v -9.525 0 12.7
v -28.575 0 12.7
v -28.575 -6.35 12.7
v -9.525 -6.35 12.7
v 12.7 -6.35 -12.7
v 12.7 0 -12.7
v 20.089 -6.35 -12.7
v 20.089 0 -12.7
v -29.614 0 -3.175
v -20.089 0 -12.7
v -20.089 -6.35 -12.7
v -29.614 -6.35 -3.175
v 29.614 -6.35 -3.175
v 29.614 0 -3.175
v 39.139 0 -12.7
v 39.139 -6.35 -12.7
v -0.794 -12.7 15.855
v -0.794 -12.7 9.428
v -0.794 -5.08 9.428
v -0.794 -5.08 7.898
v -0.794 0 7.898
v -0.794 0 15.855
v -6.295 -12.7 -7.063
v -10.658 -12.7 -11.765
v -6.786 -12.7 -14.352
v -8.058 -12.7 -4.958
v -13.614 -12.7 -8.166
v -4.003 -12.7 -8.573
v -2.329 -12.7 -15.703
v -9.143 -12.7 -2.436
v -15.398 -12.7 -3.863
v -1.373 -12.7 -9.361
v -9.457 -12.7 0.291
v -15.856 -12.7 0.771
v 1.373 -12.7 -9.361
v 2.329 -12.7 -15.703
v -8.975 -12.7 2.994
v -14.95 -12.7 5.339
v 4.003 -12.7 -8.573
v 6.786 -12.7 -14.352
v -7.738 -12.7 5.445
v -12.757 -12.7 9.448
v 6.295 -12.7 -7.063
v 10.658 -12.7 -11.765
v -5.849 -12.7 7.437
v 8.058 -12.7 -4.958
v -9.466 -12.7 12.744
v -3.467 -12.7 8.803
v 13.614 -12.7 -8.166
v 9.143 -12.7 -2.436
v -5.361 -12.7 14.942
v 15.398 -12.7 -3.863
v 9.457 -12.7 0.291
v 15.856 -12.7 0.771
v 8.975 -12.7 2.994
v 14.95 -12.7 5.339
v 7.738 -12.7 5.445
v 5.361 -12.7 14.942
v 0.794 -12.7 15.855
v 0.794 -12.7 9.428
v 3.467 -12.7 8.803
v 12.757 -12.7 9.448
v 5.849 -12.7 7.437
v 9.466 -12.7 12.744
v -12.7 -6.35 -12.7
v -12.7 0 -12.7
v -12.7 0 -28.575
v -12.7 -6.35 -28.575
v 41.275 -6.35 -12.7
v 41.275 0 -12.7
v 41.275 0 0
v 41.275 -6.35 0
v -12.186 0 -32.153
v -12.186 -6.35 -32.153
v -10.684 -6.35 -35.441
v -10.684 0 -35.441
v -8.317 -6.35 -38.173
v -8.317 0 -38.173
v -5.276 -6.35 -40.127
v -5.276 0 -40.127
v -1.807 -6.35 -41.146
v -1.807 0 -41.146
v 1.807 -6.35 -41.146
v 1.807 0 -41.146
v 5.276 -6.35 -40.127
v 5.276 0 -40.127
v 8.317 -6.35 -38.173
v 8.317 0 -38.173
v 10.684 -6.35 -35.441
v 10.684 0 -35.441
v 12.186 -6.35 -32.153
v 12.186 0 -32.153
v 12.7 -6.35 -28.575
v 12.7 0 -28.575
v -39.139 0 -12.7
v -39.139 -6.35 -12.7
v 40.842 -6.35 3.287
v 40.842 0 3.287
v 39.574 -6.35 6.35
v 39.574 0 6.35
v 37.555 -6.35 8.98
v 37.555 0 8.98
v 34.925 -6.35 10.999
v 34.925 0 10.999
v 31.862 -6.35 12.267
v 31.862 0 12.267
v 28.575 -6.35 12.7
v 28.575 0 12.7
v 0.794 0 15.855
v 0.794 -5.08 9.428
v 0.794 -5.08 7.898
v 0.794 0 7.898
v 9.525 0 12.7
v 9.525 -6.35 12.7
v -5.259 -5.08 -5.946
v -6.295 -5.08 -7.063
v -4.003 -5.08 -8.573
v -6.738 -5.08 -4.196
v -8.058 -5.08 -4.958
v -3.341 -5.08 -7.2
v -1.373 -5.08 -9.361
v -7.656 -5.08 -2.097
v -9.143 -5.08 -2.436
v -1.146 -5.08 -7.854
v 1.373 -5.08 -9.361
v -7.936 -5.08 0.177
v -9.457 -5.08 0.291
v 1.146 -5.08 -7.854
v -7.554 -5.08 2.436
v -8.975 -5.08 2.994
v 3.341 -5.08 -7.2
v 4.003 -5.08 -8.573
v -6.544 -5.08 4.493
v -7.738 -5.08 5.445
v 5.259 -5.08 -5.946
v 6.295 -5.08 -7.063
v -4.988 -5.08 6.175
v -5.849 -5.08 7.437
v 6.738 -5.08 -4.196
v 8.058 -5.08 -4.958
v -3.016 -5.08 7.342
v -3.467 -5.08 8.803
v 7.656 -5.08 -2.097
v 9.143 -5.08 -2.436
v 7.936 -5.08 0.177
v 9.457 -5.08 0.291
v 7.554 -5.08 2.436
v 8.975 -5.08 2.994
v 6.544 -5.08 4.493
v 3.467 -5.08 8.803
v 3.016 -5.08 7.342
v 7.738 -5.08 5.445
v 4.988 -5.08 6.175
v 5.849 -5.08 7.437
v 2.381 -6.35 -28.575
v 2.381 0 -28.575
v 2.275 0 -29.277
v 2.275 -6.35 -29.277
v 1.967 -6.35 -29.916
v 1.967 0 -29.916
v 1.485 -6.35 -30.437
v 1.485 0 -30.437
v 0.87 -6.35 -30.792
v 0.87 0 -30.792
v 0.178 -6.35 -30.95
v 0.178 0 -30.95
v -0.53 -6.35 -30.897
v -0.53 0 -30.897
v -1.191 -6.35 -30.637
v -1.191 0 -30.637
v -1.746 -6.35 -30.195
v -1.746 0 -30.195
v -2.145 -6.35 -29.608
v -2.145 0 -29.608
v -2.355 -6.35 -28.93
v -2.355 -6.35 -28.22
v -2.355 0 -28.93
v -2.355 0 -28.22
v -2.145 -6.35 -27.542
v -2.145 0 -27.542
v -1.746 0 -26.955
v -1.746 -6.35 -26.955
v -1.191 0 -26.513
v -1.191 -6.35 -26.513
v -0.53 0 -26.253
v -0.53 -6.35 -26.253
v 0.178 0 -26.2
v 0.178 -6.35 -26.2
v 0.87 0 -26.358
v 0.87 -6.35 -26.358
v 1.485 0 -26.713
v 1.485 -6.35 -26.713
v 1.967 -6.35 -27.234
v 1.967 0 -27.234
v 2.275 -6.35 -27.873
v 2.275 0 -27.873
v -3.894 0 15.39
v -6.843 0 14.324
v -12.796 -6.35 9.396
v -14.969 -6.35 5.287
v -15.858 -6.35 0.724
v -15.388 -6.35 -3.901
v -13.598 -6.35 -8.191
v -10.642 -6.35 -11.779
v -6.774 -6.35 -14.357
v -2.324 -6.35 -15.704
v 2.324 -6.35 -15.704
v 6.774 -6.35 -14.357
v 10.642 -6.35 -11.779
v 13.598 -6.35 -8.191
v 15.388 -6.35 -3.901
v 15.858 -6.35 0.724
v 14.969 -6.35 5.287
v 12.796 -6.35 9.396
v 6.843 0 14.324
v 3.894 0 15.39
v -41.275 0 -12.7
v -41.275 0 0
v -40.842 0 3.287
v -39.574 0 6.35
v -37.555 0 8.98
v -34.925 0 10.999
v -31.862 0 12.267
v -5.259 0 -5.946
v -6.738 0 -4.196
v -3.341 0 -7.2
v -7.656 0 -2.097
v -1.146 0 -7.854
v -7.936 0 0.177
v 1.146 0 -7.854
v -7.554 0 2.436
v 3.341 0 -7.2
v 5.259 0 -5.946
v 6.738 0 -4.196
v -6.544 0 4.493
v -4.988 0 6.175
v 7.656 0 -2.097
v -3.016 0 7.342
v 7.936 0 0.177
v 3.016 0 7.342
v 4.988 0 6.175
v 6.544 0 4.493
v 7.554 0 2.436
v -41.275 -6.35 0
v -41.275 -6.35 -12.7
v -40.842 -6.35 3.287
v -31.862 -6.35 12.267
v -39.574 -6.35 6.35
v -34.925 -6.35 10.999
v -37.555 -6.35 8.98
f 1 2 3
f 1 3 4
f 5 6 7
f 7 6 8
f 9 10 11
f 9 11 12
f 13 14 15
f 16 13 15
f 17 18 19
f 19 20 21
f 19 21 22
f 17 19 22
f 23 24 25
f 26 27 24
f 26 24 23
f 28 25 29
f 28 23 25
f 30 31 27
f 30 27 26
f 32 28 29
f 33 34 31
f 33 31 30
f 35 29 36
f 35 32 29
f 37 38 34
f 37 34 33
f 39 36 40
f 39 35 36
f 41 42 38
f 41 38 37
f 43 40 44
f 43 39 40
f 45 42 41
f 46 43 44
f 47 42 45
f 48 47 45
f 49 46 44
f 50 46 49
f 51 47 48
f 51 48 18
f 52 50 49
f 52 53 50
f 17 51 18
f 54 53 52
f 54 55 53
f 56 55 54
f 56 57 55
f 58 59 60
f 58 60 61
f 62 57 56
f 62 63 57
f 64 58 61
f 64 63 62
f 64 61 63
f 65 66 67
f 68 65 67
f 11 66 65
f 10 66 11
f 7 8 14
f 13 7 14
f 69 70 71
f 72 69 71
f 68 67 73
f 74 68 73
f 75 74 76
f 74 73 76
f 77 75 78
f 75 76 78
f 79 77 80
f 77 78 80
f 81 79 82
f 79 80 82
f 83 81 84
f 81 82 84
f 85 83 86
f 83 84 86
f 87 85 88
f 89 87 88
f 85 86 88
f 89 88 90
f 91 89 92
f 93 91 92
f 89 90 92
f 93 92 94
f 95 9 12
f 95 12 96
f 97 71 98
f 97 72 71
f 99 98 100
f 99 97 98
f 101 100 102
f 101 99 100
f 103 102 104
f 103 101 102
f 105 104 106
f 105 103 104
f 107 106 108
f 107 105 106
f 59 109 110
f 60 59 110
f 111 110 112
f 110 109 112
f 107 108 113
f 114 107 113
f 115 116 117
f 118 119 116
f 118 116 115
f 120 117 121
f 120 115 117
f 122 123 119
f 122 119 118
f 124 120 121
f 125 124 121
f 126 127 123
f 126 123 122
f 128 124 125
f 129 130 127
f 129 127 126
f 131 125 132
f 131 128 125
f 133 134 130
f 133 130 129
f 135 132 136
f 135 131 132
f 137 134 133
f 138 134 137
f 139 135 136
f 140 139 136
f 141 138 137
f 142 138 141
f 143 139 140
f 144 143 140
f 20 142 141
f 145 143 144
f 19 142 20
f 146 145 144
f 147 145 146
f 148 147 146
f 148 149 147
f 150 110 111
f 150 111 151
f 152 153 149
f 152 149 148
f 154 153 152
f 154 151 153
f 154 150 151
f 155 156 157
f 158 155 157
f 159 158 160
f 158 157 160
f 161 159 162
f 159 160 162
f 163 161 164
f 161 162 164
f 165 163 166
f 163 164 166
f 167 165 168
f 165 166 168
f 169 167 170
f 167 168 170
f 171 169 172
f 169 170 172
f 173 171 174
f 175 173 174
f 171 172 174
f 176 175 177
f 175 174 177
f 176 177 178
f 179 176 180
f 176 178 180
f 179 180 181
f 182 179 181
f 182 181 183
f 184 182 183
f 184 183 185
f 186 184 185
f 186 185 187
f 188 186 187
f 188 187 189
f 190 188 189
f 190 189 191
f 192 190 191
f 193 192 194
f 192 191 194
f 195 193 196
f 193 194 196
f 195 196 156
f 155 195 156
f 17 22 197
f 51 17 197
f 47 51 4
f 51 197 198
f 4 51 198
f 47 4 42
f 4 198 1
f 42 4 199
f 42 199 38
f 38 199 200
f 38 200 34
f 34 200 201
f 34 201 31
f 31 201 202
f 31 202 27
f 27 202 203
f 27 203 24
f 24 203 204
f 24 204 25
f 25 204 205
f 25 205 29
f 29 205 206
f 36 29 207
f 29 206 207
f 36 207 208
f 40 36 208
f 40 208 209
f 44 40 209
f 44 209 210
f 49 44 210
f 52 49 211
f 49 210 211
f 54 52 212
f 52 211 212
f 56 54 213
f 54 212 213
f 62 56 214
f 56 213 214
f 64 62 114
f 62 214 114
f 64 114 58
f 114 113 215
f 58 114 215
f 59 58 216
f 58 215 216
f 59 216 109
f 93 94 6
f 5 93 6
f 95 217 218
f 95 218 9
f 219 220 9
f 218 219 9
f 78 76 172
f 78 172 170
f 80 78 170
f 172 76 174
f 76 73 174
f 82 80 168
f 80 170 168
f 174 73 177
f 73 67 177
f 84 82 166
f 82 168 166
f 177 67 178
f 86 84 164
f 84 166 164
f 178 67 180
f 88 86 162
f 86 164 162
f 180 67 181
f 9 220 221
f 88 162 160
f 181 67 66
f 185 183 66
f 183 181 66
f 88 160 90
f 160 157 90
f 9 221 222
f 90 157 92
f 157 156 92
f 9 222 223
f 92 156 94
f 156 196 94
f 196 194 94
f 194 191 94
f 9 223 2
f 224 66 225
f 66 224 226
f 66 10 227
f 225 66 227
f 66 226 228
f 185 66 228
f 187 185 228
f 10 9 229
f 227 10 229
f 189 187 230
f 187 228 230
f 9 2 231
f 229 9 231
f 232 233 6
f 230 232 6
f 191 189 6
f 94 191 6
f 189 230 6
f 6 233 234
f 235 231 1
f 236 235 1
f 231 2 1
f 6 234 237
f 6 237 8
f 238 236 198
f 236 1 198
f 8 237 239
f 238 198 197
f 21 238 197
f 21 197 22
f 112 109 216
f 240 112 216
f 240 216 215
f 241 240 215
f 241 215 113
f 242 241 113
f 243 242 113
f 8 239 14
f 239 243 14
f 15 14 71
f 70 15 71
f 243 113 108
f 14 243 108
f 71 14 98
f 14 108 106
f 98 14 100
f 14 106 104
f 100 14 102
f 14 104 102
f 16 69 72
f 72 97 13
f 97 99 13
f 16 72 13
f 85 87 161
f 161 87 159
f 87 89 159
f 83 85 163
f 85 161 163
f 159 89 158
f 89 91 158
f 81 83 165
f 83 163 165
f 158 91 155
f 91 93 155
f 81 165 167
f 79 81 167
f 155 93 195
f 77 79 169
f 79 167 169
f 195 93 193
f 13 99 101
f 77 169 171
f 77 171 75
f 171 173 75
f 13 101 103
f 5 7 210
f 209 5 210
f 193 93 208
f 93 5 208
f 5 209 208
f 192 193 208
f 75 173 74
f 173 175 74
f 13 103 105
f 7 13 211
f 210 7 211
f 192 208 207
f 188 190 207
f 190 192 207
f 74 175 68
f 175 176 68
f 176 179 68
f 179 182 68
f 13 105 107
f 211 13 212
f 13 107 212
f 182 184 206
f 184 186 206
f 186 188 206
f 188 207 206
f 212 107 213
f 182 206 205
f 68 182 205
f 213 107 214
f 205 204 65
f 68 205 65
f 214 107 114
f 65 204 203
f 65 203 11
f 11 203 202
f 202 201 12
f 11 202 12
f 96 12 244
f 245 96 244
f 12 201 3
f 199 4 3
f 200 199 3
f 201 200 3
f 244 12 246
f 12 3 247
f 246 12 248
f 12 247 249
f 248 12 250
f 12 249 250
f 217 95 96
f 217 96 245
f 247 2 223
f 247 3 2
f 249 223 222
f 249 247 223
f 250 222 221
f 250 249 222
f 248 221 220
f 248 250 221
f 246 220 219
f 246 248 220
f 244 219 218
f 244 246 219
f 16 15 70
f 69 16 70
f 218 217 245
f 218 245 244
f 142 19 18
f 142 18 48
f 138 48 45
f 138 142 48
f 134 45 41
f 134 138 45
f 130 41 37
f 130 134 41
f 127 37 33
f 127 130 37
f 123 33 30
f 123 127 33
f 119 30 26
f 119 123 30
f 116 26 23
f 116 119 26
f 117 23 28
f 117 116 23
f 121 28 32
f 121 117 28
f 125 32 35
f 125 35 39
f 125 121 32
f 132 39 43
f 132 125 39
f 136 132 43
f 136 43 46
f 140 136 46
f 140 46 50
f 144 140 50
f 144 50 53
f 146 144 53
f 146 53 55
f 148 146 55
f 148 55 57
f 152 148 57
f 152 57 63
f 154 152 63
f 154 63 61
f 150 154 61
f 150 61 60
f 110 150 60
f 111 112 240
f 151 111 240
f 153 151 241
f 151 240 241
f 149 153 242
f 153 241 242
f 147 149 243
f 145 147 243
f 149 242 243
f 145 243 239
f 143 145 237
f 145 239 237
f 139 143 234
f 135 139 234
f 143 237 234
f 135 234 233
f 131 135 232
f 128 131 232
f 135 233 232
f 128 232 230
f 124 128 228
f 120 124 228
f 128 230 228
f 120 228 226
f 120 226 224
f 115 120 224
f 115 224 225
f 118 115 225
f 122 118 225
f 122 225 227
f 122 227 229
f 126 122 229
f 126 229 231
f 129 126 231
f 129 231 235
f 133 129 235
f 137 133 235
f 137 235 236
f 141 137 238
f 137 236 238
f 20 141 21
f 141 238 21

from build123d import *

# Parameters (mm, degrees)
F0_R      = 15.875
F0_R_2    = 9.4615
F1_DEPTH  = 12.7
F3_DEPTH  = 6.35
F5_DEPTH  = 6.35
F7_R      = 12.7
F8_W      = 1.5875
F8_H      = 18.0220451
F9_DEPTH  = 12.701
F11_DEPTH = 5.08


with BuildPart() as f1:
    # F0 (on Front) → F1 (new body)
    with BuildSketch(Plane.XZ):
        Circle(F0_R)
        Circle(F0_R_2, mode=Mode.SUBTRACT)
    extrude(amount=F1_DEPTH)

    # F2 (on Front) → F3 (join)
    with BuildSketch(Plane.XZ):
        with BuildLine():
            Line((12.7, -9.525), (-12.7, -9.525))
            Line((-12.7, -9.525), (-12.7, -28.575))
            Line((-12.7, -28.575), (-2.38125, -28.575))
            ThreePointArc((-2.38125, -28.575), (0, -26.19375), (2.38125, -28.575))
            Line((2.38125, -28.575), (12.7, -28.575))
            Line((12.7, -28.575), (12.7, -9.525))
        make_face()
        with BuildLine():
            Line((-2.38125, -28.575), (-12.7, -28.575))
            ThreePointArc((-12.7, -28.575), (0, -41.275), (12.7, -28.575))
            Line((12.7, -28.575), (2.38125, -28.575))
            ThreePointArc((2.38125, -28.575), (0, -30.95625), (-2.38125, -28.575))
        make_face()
    extrude(amount=F3_DEPTH)

    # F4 (on Front) → F5 (join)
    with BuildSketch(Plane.XZ):
        Polygon((41.275, 12.7), (9.525, 12.7), (9.525, -12.7), (20.088640973, -12.7), (29.613640973, -3.175), (39.138640973, -12.7), (41.275, -12.7), align=None)
    extrude(amount=F5_DEPTH)

    # F6: F1 across plane


with BuildPart() as f1_1:
    add(f1.part)
    add(f1.part.mirror(Plane.YZ))

    # F7
    f7_edges = [f1_1.edges().sort_by_distance(p)[0] for p in [
        (41.275, -3.175, 12.7),
        (-41.275, -3.175, 12.7),
    ]]
    fillet(f7_edges, radius=F7_R)

    # F8 (on Front) → F9 (cut, through all)
    with BuildSketch(Plane.XZ):
        with Locations((0, 9.5910543679)):
            Rectangle(F8_W, F8_H)
    extrude(amount=F9_DEPTH, mode=Mode.SUBTRACT)

    # F10 (on Front) → F11 (join)
    with BuildSketch(Plane.XZ):
        with BuildLine():
            Line((-0.79375, 7.897712782), (-0.79375, 9.4281463283))
            ThreePointArc((-0.79375, 9.4281463283), (0, -9.4615), (0.79375, 9.4281463283))
            Line((0.79375, 9.4281463283), (0.79375, 7.897712782))
            ThreePointArc((0.79375, 7.897712782), (0, -7.9375), (-0.79375, 7.897712782))
        make_face()
    extrude(amount=F11_DEPTH)


solid = f1_1.part
